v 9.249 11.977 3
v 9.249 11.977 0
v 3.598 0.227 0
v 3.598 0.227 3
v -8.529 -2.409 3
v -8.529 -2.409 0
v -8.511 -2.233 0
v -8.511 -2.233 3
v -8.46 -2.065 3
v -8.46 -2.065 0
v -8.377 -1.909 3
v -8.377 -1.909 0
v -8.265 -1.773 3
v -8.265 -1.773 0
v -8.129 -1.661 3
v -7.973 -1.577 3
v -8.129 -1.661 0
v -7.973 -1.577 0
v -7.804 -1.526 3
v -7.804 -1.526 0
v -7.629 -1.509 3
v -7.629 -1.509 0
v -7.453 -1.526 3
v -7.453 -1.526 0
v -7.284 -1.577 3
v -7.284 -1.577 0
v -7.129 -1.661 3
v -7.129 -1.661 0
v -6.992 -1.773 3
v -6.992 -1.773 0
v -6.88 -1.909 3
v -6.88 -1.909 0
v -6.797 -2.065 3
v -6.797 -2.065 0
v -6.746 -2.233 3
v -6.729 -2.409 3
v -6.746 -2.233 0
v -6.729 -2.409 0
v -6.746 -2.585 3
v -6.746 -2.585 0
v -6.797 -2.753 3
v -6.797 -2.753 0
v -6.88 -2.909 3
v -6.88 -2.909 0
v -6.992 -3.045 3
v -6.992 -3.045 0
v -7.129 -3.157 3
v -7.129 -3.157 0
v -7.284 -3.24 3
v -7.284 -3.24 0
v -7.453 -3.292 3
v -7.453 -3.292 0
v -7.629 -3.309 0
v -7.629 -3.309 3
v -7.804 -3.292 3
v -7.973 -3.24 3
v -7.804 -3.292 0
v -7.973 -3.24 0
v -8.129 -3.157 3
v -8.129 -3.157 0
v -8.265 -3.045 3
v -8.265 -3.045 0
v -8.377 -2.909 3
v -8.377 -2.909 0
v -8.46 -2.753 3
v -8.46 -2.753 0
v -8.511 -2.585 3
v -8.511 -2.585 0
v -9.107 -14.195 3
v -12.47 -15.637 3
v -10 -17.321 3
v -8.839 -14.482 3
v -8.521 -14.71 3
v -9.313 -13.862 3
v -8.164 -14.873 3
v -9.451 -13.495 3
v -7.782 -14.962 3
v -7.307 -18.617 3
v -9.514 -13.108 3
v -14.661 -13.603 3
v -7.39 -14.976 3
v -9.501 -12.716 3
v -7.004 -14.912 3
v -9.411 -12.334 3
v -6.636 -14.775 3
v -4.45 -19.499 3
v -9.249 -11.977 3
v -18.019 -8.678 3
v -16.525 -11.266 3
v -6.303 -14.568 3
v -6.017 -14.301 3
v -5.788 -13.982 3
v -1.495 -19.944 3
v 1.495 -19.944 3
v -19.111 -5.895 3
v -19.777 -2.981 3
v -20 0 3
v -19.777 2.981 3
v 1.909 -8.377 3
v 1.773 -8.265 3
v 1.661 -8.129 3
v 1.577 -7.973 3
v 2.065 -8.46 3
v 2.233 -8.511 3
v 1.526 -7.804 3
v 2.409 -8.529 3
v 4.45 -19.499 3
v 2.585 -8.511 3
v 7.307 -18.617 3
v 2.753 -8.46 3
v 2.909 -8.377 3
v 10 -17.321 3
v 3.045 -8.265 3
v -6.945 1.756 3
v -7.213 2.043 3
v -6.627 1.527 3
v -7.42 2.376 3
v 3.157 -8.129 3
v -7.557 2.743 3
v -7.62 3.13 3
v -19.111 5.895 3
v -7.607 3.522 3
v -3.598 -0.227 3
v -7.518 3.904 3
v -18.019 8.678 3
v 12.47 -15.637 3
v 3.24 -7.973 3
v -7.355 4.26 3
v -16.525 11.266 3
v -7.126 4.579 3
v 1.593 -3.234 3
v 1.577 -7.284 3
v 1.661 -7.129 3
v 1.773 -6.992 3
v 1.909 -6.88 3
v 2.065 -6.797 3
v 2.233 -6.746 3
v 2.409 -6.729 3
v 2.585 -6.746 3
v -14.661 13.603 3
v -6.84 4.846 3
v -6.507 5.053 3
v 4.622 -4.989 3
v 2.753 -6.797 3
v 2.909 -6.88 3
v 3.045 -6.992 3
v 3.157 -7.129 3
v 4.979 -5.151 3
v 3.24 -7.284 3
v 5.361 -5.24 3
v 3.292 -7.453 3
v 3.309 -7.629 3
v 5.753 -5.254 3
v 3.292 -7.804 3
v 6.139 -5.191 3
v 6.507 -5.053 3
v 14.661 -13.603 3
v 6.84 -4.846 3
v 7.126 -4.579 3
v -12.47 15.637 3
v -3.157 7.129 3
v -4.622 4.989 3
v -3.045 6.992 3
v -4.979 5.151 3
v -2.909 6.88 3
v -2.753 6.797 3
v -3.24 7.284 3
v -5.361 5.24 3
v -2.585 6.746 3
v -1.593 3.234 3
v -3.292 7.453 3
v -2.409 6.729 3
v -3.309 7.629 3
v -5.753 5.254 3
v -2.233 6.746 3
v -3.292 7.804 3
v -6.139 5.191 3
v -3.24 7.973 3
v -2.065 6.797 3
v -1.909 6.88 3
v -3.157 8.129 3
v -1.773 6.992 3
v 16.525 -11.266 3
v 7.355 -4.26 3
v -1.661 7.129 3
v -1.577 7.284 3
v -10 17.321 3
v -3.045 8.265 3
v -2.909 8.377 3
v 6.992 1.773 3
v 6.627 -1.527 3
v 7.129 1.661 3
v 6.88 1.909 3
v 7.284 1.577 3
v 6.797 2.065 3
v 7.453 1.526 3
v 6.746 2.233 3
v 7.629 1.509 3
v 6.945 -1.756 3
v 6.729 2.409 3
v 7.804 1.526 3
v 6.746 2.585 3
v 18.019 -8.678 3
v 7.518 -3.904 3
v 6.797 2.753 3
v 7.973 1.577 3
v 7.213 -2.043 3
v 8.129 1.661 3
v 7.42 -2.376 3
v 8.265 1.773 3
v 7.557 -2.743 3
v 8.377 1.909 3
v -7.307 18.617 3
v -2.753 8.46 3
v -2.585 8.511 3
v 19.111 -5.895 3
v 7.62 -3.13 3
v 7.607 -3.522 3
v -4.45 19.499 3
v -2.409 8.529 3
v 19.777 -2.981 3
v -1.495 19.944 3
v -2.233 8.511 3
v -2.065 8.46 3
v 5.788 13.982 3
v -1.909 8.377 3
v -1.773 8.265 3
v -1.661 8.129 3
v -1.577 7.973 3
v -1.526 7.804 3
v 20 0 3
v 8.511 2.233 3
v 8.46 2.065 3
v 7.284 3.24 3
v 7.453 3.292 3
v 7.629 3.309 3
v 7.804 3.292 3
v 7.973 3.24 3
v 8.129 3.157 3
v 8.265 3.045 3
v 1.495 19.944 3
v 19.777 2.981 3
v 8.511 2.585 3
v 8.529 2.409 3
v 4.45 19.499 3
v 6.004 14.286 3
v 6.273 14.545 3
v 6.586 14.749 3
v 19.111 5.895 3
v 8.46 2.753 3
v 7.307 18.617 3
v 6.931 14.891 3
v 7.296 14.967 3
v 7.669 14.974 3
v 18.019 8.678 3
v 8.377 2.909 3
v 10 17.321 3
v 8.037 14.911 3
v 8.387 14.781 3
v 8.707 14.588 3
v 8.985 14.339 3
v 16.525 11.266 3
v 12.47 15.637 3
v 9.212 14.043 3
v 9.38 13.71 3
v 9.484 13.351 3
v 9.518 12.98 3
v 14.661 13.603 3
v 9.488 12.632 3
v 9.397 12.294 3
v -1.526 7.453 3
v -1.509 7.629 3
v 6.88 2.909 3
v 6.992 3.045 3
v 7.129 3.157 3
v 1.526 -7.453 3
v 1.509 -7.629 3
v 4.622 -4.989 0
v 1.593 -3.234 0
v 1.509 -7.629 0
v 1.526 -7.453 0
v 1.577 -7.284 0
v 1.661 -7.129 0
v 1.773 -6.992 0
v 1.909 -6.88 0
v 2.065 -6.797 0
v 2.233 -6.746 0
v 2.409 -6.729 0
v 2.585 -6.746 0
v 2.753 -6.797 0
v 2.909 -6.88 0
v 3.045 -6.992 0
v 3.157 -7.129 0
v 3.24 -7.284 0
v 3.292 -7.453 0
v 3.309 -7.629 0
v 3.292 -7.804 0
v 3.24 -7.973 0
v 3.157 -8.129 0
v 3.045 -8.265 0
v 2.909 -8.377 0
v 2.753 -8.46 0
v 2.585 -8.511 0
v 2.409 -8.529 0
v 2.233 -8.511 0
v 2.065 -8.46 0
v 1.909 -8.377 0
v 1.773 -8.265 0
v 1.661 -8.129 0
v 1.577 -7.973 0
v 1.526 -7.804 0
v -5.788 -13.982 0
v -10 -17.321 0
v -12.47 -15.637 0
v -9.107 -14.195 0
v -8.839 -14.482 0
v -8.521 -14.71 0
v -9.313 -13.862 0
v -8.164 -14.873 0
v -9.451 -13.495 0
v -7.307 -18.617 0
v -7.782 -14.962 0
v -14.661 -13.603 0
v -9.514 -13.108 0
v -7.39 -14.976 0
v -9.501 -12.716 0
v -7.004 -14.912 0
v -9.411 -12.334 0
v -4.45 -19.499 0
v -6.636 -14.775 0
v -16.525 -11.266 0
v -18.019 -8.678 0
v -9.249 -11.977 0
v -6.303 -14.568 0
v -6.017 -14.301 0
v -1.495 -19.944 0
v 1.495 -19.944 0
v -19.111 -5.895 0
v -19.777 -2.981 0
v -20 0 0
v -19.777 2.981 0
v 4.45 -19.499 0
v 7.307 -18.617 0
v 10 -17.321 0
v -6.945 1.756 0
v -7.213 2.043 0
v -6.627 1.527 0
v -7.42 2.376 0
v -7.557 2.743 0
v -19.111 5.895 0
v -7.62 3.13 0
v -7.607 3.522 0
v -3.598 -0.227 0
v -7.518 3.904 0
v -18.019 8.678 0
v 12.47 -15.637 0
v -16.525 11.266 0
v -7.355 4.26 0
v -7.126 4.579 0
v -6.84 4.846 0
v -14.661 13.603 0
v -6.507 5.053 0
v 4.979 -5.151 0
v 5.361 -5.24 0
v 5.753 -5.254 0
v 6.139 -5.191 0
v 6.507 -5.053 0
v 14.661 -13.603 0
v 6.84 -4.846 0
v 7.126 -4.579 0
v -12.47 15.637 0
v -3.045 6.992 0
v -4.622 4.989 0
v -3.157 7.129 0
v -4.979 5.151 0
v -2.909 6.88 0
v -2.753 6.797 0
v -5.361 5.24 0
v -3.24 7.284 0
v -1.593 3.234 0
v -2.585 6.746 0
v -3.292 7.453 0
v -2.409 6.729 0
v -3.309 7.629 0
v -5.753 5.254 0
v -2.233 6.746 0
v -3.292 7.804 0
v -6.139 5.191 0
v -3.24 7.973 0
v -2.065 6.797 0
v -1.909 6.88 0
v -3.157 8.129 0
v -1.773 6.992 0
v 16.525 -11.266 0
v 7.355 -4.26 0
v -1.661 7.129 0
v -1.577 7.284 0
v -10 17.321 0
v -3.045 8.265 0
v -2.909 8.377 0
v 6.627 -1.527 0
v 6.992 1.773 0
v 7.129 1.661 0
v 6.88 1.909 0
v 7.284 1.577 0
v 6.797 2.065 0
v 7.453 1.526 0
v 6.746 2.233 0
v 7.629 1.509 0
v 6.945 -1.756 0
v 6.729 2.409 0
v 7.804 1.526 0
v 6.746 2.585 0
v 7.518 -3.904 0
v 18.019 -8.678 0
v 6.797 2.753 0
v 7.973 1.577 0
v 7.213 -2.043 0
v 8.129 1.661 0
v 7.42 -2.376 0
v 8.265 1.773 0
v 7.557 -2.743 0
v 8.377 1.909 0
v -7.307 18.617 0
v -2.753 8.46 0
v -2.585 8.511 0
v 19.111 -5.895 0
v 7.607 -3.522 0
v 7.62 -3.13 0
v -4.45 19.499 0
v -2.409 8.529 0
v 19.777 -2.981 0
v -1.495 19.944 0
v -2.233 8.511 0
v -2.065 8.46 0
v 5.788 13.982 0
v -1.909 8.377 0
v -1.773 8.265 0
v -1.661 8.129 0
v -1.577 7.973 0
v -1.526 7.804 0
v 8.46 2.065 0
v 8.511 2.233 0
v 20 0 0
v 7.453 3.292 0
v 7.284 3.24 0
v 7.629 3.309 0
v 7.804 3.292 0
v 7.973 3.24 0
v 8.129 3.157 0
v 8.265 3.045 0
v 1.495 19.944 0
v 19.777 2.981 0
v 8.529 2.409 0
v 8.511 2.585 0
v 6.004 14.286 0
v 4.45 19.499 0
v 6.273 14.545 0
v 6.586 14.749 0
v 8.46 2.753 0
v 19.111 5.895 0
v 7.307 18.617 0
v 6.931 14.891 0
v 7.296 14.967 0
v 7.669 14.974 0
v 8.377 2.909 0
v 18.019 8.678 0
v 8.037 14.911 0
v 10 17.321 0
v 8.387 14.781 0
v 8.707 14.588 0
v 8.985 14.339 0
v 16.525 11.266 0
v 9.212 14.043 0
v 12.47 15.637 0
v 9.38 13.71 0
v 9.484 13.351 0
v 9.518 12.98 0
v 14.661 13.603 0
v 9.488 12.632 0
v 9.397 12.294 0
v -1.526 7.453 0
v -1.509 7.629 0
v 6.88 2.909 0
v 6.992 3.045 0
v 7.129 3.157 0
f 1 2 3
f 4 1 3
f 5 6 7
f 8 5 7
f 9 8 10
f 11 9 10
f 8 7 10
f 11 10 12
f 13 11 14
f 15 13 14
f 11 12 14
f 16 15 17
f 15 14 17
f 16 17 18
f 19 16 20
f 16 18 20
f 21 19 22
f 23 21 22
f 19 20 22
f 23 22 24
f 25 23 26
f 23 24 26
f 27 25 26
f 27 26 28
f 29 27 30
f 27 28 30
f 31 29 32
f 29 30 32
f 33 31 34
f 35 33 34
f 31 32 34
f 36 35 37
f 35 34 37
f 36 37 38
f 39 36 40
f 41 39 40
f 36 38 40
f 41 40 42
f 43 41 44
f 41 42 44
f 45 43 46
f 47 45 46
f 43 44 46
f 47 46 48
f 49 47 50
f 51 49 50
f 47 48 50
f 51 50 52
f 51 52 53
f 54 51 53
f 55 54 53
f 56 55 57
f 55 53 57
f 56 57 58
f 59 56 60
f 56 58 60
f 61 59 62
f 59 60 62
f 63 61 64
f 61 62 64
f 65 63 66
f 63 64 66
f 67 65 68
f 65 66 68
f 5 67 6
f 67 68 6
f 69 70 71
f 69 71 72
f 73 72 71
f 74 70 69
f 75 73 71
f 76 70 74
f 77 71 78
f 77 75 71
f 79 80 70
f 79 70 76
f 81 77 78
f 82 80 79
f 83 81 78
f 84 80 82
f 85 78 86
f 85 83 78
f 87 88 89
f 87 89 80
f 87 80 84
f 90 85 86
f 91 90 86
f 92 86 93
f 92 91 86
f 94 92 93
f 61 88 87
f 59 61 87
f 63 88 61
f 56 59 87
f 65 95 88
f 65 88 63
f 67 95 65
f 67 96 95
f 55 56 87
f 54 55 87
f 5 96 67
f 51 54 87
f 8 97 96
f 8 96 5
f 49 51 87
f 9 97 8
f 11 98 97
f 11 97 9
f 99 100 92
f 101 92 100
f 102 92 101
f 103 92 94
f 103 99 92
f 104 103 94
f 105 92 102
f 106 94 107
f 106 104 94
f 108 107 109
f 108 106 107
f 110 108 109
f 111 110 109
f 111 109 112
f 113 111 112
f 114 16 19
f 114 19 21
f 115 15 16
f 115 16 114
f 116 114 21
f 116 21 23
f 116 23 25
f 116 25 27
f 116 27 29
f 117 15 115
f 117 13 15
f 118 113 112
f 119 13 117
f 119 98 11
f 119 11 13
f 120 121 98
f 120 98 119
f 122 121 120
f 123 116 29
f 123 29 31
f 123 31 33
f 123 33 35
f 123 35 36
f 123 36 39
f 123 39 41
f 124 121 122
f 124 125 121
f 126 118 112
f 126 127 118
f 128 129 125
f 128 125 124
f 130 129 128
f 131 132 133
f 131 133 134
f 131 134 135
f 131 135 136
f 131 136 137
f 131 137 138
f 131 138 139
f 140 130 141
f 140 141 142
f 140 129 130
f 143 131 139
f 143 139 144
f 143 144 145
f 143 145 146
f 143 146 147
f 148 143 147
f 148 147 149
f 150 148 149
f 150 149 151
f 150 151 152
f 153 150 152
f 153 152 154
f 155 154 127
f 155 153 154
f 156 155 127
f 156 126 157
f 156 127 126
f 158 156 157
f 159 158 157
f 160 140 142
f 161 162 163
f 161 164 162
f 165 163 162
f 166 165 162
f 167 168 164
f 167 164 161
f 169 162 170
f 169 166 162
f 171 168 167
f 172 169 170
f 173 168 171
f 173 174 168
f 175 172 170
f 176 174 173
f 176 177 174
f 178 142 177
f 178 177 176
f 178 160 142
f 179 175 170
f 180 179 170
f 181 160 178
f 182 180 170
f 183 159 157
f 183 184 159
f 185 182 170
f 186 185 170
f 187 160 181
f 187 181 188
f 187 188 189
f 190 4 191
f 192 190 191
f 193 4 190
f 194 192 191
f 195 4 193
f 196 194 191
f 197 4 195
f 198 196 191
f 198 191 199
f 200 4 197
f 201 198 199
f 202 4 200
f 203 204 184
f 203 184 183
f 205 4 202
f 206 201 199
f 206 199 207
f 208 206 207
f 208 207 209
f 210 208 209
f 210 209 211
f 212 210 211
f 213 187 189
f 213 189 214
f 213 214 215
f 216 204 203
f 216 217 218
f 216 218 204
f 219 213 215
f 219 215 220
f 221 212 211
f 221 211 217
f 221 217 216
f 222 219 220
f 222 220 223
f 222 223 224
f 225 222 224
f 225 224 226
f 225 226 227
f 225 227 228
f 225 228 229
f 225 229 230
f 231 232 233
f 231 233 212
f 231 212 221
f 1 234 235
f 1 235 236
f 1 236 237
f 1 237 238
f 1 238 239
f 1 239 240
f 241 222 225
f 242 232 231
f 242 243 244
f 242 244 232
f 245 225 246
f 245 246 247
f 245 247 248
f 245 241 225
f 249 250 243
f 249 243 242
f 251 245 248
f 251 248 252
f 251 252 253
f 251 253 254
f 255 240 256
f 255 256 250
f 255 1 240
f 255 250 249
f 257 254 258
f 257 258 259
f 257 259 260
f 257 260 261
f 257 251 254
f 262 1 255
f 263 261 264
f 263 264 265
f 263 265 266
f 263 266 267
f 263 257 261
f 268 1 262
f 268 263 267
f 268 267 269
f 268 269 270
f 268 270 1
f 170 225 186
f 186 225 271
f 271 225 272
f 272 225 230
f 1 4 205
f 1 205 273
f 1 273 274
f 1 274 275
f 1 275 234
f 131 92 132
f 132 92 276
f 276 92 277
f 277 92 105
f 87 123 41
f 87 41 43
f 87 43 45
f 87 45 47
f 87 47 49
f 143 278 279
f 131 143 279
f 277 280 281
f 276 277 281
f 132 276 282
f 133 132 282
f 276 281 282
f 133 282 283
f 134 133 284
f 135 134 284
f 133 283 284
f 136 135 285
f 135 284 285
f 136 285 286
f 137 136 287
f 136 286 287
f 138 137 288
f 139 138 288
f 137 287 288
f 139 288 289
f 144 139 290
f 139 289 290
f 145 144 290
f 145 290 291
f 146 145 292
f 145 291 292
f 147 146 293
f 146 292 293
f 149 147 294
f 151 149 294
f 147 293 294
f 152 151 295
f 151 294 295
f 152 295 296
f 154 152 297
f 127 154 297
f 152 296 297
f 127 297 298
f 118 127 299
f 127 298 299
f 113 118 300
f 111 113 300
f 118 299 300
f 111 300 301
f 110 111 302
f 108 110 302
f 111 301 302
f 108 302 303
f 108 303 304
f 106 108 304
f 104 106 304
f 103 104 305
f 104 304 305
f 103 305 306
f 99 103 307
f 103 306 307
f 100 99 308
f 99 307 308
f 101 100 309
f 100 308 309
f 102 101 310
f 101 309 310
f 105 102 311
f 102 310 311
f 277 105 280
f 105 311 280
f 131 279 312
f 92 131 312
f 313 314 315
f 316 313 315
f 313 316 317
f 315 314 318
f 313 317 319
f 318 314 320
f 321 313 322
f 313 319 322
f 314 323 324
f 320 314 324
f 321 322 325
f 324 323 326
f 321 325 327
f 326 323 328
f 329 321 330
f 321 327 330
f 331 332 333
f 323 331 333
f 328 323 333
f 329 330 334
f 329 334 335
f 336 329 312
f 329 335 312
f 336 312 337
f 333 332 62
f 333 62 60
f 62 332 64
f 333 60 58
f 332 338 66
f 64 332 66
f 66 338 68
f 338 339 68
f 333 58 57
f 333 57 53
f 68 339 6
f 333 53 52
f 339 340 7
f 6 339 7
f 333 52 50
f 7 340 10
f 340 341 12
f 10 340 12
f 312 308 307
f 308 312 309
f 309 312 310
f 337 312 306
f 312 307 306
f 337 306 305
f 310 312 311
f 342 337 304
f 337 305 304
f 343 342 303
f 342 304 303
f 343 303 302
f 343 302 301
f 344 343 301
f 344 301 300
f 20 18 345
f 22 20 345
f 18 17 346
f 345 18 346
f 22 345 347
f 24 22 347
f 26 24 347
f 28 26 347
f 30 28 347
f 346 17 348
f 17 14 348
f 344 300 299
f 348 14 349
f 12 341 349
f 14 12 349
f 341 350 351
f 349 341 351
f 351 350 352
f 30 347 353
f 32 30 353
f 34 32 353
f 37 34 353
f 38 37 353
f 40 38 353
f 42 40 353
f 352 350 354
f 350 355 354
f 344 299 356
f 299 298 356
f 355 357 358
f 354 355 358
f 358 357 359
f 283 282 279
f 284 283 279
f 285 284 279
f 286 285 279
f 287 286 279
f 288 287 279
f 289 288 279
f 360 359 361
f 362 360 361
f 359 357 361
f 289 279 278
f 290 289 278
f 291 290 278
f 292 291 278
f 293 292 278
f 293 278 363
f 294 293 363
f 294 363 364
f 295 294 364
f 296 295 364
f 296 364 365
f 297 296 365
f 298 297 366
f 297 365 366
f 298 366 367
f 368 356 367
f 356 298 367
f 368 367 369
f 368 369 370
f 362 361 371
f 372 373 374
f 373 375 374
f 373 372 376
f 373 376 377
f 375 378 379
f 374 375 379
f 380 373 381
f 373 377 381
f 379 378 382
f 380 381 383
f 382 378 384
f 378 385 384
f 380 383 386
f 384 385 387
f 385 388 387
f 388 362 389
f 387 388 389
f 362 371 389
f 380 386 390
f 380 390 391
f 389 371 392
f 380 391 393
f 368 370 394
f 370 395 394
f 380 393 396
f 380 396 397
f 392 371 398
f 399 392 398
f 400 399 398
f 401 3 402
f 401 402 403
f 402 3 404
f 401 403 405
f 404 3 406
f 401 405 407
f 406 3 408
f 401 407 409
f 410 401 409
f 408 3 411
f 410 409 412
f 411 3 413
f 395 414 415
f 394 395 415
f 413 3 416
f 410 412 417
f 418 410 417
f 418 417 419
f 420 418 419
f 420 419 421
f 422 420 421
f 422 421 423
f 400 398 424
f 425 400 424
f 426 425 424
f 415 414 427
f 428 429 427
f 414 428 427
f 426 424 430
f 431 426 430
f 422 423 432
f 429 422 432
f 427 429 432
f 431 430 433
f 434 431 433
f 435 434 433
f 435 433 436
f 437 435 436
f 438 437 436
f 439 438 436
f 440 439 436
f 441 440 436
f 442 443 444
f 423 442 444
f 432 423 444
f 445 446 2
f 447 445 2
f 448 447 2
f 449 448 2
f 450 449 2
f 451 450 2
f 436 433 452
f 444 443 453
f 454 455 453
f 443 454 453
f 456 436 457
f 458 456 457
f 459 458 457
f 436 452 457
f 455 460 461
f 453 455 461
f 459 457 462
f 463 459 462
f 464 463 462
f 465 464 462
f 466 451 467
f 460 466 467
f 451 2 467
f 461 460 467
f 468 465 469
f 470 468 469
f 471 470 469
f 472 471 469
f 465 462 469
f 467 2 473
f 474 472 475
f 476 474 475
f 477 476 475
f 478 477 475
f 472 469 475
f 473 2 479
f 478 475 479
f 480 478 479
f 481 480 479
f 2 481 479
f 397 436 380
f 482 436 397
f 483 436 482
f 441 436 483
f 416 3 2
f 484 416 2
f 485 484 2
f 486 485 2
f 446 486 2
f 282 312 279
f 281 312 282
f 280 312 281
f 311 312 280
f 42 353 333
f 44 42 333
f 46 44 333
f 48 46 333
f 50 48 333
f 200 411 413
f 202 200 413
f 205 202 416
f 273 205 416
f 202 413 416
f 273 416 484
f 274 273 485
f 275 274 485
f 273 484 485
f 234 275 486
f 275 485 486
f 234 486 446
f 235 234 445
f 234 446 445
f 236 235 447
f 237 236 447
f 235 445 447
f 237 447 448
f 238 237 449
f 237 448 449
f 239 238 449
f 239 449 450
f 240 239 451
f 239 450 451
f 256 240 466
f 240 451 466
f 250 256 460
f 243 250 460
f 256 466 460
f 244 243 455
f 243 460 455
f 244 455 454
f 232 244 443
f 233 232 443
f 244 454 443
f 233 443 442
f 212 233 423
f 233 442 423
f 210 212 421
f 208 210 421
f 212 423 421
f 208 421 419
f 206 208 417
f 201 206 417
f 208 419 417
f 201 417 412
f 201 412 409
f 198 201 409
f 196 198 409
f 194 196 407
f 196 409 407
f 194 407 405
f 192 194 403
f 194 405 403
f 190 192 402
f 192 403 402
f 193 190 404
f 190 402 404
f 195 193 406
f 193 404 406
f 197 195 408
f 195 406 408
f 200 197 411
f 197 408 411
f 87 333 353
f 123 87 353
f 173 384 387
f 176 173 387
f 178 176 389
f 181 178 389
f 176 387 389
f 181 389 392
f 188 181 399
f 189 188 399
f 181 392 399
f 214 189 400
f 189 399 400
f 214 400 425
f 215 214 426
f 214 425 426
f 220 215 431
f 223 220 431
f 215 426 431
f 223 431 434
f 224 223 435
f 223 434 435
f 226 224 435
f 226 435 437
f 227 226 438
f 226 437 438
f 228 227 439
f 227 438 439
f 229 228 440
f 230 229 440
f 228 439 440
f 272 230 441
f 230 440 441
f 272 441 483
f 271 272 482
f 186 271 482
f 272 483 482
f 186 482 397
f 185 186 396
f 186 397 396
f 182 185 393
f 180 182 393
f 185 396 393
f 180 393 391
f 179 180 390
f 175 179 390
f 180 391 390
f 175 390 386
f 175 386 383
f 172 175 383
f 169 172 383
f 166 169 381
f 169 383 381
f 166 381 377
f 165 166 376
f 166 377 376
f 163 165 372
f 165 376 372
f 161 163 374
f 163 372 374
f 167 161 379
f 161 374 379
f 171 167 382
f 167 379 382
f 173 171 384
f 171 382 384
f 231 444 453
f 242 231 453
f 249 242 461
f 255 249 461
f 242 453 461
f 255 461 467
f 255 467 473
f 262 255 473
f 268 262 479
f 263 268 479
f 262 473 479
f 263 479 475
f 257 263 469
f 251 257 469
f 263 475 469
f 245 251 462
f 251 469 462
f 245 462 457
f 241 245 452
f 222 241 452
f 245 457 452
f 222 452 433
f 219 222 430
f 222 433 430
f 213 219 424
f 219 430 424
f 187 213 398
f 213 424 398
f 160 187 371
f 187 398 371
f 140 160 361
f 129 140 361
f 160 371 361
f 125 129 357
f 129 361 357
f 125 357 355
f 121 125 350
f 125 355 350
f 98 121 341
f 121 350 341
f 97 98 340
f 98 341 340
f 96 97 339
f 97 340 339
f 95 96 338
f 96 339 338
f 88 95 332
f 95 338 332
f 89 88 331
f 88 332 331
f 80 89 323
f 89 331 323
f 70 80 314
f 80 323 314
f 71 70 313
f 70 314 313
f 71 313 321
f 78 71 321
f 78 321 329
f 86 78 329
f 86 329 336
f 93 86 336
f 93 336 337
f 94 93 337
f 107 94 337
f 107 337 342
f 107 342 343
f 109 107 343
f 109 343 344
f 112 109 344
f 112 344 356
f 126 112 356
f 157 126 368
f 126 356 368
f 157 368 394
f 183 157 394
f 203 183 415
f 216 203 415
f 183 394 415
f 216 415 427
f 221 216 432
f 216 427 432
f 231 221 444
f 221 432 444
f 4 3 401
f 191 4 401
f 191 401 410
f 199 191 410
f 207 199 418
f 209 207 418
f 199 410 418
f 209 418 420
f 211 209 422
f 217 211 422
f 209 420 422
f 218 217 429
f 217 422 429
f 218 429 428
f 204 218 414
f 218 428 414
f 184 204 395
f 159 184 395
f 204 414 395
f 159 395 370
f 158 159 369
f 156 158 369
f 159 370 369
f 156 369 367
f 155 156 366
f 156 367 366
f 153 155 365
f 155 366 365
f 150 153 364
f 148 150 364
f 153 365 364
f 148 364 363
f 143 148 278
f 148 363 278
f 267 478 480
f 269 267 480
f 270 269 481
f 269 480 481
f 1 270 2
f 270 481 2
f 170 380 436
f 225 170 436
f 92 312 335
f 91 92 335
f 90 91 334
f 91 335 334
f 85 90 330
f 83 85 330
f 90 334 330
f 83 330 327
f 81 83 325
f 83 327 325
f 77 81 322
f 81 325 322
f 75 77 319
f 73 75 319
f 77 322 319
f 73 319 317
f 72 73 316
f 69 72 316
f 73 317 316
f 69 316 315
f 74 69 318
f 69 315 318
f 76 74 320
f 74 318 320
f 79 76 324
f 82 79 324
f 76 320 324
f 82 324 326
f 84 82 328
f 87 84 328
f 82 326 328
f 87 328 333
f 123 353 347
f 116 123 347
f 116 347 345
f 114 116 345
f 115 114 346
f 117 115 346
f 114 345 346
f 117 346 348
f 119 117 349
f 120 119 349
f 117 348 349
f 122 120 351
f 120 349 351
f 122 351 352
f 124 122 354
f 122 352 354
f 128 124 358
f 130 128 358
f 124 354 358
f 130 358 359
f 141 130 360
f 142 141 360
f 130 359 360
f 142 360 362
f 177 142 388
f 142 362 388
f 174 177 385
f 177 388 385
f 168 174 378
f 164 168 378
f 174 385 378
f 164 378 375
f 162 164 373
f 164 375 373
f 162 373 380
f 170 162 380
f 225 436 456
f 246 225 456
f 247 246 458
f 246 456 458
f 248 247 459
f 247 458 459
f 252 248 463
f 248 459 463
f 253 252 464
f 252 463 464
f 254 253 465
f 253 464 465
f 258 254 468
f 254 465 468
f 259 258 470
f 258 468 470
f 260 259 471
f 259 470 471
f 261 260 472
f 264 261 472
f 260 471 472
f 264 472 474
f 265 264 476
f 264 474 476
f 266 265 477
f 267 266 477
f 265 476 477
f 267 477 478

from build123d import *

# Parameters (mm, degrees)
SKETCH1_R           = 20
BOSS_EXTRUDE1_DEPTH = 3
SKETCH2_R           = 0.9
CUT_EXTRUDE1_DEPTH  = 3


with BuildPart() as part:
    # Sketch1 → Boss-Extrude1 (new body)
    with BuildSketch(Plane.XY):
        Circle(SKETCH1_R)
        with BuildLine():
            ThreePointArc((-6.627007241, 1.527342474), (-7.35518547, 4.260427995), (-4.622099949, 4.988606224))
            Line((-4.622099949, 4.988606224), (-1.593494167, 3.234312344))
            Line((-1.593494167, 3.234312344), (5.787770469, 13.982192711))
            ThreePointArc((5.787770469, 13.982192711), (8.037409208, 14.911223436), (9.518402344, 12.979739065))
            ThreePointArc((9.518402344, 12.979739065), (9.449886715, 12.460732201), (9.24903422, 11.977285419))
            Line((9.24903422, 11.977285419), (3.598401459, 0.226951406))
            Line((3.598401459, 0.226951406), (6.627007241, -1.527342474))
            ThreePointArc((6.627007241, -1.527342474), (7.35518547, -4.260427995), (4.622099949, -4.988606224))
            Line((4.622099949, -4.988606224), (1.593494167, -3.234312344))
            Line((1.593494167, -3.234312344), (-5.787770469, -13.982192711))
            ThreePointArc((-5.787770469, -13.982192711), (-8.52085599, -14.71037094), (-9.24903422, -11.977285419))
            Line((-9.24903422, -11.977285419), (-3.598401459, -0.226951406))
            Line((-3.598401459, -0.226951406), (-6.627007241, 1.527342474))
        make_face(mode=Mode.SUBTRACT)
    extrude(amount=BOSS_EXTRUDE1_DEPTH)

    # Sketch2 → Cut-Extrude1 (cut)
    with BuildSketch(Plane(origin=(0, 0, 0), x_dir=(-1, 0, 0), z_dir=(0, 0, -1))):
        with Locations((-2.408978249, -7.628684277)):
            Circle(SKETCH2_R)
        with Locations((-7.628684277, 2.408978249)):
            Circle(SKETCH2_R)
        with Locations((2.408978249, 7.628684277)):
            Circle(SKETCH2_R)
        with Locations((7.628684277, -2.408978249)):
            Circle(SKETCH2_R)
    extrude(amount=-CUT_EXTRUDE1_DEPTH, mode=Mode.SUBTRACT)


solid = part.part
